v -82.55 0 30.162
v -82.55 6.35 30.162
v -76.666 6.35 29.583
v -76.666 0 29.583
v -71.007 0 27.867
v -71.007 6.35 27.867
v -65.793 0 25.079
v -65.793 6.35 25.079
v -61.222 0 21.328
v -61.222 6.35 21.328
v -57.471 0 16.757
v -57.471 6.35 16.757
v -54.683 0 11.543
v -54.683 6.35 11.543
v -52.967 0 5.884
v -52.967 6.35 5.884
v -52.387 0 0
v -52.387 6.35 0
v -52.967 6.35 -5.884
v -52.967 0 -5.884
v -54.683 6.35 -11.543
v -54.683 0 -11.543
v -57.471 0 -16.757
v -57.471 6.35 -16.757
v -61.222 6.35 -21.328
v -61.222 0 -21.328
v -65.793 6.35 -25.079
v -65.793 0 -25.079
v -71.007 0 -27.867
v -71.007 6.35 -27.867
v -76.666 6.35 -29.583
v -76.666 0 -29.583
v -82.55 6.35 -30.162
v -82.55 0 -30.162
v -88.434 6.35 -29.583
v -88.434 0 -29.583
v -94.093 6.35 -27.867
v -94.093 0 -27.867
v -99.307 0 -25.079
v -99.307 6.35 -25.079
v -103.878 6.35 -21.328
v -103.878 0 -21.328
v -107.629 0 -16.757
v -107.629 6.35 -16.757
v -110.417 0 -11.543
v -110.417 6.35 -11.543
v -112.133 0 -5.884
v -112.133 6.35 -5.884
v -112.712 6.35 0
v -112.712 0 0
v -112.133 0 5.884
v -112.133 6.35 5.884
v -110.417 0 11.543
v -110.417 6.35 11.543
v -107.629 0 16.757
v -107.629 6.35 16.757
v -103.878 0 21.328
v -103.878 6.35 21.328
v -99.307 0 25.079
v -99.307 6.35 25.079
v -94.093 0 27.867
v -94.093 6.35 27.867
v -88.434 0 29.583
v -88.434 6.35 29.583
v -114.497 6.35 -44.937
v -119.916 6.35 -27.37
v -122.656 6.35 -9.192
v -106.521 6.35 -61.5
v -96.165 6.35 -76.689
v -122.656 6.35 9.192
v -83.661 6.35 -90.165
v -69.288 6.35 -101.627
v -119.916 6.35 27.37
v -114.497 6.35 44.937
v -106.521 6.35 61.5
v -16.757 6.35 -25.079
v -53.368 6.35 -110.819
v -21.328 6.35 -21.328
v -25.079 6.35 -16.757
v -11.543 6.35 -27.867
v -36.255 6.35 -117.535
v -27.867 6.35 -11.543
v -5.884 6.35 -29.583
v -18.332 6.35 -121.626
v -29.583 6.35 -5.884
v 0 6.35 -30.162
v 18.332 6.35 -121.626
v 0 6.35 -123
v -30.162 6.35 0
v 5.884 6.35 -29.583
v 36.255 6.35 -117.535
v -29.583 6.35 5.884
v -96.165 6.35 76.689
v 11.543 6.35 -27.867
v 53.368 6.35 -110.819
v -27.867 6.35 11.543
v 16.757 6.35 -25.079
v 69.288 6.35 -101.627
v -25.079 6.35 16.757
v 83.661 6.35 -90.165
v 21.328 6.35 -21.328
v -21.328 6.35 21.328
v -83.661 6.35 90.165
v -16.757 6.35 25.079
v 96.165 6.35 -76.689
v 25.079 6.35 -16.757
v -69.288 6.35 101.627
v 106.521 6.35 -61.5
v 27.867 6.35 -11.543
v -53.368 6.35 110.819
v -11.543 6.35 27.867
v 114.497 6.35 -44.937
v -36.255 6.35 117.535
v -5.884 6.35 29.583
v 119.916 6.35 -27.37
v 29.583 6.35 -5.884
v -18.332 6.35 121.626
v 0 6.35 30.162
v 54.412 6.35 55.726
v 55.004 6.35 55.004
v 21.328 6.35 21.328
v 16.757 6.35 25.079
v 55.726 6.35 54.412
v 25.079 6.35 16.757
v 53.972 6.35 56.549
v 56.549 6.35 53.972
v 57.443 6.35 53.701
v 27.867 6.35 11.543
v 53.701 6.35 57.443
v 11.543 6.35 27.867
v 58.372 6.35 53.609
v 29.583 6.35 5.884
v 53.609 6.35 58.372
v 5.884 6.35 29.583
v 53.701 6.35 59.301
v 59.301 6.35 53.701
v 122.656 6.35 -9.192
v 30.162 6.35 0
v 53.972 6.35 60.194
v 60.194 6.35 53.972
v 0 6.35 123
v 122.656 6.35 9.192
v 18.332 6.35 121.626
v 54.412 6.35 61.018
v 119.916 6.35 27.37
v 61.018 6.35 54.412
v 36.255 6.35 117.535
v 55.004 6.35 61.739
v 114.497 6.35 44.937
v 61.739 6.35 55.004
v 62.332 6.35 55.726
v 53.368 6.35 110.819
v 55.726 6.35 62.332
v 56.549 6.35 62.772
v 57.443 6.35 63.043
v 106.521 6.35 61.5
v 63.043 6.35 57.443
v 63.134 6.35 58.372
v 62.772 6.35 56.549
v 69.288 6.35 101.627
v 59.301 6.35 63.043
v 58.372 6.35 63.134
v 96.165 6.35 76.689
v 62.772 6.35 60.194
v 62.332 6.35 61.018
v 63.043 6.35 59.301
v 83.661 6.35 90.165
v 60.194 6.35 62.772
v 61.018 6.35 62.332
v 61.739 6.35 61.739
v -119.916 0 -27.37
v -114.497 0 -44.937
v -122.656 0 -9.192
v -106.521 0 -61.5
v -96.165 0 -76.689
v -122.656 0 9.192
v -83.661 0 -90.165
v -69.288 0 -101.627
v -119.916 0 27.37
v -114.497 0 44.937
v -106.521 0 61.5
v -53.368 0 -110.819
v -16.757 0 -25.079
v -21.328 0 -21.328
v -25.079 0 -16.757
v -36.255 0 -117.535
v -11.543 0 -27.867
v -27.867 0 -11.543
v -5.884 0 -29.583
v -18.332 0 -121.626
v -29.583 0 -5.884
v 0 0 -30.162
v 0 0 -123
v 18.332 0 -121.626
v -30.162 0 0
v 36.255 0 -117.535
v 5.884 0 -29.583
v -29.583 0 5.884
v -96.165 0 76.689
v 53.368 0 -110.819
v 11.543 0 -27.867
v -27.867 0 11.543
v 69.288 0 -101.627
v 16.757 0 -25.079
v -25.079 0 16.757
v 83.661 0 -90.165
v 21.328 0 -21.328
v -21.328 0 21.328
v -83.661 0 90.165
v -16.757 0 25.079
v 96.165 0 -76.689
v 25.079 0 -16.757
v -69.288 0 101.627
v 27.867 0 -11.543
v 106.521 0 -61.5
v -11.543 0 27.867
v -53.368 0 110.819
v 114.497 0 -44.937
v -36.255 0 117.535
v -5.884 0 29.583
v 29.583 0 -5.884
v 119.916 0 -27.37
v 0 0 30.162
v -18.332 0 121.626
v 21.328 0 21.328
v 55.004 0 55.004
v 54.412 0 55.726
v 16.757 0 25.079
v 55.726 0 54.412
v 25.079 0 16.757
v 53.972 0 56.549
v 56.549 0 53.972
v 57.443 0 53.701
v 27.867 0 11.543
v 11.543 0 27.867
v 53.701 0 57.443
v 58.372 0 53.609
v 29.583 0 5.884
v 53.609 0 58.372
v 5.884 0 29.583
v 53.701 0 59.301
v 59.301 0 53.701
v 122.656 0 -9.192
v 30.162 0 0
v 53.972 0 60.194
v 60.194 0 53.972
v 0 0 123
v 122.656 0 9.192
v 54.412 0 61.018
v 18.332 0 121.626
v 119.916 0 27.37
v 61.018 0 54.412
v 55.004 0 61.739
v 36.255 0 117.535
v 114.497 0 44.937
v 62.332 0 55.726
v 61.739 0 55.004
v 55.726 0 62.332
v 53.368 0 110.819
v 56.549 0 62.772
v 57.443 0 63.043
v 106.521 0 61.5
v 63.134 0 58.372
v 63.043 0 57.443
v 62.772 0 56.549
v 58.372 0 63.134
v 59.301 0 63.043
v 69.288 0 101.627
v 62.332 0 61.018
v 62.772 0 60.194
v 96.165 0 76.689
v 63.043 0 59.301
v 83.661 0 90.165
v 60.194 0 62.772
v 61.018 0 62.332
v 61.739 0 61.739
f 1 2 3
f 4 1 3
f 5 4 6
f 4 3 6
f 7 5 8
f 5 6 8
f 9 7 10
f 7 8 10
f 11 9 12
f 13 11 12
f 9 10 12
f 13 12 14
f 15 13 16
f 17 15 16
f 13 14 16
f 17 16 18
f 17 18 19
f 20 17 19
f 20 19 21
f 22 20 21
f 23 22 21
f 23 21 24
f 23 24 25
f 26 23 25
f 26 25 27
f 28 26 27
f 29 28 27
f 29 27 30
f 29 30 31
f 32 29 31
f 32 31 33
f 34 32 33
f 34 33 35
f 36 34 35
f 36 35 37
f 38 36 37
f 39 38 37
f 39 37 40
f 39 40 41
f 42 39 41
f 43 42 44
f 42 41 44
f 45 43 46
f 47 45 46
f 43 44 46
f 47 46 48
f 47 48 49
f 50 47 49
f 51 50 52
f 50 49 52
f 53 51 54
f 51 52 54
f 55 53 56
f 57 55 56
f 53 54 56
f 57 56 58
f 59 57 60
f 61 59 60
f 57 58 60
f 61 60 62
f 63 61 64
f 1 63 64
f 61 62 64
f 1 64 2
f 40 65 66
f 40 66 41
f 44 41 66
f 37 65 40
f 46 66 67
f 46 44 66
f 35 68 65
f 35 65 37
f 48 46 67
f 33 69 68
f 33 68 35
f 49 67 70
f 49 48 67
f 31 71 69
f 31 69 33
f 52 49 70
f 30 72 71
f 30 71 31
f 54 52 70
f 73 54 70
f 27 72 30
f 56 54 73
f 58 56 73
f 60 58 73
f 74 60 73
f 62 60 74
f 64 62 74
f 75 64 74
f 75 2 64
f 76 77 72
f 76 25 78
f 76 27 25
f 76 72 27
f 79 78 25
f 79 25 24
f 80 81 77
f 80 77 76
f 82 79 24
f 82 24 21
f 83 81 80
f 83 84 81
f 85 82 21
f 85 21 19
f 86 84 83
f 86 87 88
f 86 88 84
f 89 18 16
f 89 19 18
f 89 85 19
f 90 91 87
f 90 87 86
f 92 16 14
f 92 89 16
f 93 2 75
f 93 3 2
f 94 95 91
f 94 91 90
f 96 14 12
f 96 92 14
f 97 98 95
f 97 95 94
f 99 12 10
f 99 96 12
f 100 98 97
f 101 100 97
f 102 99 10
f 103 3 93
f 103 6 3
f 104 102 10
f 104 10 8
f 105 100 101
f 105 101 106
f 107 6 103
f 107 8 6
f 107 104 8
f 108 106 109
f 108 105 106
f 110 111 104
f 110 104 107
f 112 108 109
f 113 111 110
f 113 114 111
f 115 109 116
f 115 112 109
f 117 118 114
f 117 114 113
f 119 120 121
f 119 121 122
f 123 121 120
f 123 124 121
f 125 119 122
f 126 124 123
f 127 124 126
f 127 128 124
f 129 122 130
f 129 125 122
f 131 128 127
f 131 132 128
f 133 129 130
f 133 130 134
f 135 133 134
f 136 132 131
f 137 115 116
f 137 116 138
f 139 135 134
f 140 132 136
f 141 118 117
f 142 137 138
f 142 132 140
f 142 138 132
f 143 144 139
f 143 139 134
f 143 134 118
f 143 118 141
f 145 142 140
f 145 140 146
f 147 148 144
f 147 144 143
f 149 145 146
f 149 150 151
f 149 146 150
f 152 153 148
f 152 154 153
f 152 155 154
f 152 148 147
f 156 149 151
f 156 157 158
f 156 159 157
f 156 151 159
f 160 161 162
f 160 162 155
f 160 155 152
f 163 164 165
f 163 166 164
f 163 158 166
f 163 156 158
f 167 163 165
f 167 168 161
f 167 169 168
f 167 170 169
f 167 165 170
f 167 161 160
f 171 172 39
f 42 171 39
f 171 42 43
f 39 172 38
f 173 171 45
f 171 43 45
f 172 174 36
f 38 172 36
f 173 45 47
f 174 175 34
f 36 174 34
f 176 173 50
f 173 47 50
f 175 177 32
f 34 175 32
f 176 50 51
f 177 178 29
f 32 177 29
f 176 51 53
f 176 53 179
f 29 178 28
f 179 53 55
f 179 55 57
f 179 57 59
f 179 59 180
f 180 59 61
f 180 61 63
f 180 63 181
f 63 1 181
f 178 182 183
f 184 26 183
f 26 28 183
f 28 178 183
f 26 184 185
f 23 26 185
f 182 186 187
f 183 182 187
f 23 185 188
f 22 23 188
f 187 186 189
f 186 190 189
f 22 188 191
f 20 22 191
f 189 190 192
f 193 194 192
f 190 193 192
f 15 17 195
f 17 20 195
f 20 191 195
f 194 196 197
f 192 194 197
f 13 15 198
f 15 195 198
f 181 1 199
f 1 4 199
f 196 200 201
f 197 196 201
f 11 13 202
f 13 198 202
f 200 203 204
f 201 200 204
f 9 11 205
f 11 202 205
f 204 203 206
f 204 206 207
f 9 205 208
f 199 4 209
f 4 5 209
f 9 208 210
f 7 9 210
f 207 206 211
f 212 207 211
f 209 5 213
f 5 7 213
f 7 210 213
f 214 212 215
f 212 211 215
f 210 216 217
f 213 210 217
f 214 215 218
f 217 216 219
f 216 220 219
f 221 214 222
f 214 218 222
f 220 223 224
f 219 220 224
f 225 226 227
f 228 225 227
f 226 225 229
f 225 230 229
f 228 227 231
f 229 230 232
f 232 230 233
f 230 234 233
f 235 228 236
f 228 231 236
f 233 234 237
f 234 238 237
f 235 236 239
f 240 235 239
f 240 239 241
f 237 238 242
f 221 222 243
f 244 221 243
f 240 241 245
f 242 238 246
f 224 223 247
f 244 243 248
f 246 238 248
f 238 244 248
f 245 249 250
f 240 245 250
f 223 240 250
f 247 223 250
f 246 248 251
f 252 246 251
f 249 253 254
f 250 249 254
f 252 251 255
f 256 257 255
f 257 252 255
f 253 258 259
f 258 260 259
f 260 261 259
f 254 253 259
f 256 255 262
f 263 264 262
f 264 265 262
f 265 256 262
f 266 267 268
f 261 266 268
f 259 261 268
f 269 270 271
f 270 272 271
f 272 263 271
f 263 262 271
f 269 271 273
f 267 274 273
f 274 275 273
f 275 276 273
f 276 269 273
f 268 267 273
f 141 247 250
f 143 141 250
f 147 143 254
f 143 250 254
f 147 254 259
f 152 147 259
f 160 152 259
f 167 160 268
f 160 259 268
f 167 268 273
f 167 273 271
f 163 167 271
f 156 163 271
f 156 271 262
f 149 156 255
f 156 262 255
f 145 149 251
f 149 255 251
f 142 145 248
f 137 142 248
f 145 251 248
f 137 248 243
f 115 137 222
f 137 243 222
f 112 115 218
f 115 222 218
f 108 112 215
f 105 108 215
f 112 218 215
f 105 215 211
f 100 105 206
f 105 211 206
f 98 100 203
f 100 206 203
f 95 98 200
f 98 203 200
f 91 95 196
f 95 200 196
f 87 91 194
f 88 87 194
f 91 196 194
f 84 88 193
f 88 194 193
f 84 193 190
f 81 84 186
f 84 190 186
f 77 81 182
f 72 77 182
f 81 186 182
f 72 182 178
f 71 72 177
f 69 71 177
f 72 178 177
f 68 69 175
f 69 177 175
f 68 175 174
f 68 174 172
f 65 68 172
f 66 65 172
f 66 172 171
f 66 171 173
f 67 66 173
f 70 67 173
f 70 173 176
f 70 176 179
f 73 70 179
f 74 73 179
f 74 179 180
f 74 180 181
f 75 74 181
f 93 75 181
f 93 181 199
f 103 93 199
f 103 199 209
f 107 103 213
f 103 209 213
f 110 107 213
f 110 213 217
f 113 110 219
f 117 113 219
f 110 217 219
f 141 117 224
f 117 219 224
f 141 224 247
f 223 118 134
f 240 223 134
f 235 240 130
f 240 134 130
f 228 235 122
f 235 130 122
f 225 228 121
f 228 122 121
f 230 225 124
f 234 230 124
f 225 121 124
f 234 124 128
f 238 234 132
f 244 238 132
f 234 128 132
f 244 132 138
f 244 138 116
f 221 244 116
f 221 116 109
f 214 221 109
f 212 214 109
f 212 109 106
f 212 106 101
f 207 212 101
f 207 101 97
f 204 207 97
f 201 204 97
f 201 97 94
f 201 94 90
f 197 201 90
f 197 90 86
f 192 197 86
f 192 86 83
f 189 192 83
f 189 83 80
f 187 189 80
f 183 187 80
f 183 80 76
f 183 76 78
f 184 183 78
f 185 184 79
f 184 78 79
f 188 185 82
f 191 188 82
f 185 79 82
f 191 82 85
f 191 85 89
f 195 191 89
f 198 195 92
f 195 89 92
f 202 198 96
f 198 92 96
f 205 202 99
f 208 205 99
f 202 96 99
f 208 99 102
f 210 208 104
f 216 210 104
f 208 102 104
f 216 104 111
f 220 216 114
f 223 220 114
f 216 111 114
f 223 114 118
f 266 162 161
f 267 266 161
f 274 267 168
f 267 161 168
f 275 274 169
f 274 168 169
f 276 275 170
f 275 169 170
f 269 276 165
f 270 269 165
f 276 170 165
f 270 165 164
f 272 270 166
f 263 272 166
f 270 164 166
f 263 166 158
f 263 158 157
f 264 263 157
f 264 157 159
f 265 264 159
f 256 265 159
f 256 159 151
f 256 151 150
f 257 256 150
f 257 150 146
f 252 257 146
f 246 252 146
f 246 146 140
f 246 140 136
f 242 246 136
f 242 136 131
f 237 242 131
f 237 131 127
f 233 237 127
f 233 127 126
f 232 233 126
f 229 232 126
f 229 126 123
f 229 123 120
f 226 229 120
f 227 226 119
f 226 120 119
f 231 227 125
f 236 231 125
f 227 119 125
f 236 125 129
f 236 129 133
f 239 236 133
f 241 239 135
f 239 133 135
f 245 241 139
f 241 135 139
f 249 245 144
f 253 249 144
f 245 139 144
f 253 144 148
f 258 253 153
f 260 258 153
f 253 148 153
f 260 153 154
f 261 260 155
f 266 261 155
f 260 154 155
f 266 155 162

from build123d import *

# Parameters (mm, degrees)
SKETCH1_R           = 123
BOSS_EXTRUDE1_DEPTH = 6.35
SKETCH2_R           = 30.1625
CUT_EXTRUDE1_DEPTH  = 175.064133296
CUT_EXTRUDE2_REACH  = 176.064
SKETCH3_R           = 4.7625


with BuildPart() as part:
    # Sketch1 → Boss-Extrude1 (new body)
    with BuildSketch(Plane(origin=(0, 0, 0), x_dir=(1, 0, 0), z_dir=(0, 1, 0))):
        with Locations(Location((0, 0, 0), (0, 0, 270))):
            Circle(SKETCH1_R)
    extrude(amount=BOSS_EXTRUDE1_DEPTH)

    # Sketch2 → Cut-Extrude1 (cut, through all)
    with BuildSketch(Plane(origin=(0, 6.35, 0), x_dir=(1, 0, 0), z_dir=(0, 1, 0))):
        with Locations(Location((0, 0, 0), (0, 0, 270))):
            Circle(SKETCH2_R)
        with Locations(Location((-82.55, 0, 0), (0, 0, 270))):
            Circle(SKETCH2_R)
    extrude(amount=-CUT_EXTRUDE1_DEPTH, mode=Mode.SUBTRACT)

    # Sketch3 → Cut-Extrude2 (cut, up to next)
    with BuildSketch(Plane(origin=(0, 6.35, 0), x_dir=(1, 0, 0), z_dir=(0, 1, 0)), mode=Mode.PRIVATE) as cut_extrude2_sk1:
        with Locations(Location((58.371664787, -58.371664787, 0), (0, 0, 270))):
            Circle(SKETCH3_R)
    cut_extrude2_tool1 = extrude(cut_extrude2_sk1.sketch, amount=-CUT_EXTRUDE2_REACH, mode=Mode.PRIVATE) & part.part
    add(cut_extrude2_tool1.solids().sort_by_distance((58.371665, 6.35, 58.371665))[0], mode=Mode.SUBTRACT)


solid = part.part
